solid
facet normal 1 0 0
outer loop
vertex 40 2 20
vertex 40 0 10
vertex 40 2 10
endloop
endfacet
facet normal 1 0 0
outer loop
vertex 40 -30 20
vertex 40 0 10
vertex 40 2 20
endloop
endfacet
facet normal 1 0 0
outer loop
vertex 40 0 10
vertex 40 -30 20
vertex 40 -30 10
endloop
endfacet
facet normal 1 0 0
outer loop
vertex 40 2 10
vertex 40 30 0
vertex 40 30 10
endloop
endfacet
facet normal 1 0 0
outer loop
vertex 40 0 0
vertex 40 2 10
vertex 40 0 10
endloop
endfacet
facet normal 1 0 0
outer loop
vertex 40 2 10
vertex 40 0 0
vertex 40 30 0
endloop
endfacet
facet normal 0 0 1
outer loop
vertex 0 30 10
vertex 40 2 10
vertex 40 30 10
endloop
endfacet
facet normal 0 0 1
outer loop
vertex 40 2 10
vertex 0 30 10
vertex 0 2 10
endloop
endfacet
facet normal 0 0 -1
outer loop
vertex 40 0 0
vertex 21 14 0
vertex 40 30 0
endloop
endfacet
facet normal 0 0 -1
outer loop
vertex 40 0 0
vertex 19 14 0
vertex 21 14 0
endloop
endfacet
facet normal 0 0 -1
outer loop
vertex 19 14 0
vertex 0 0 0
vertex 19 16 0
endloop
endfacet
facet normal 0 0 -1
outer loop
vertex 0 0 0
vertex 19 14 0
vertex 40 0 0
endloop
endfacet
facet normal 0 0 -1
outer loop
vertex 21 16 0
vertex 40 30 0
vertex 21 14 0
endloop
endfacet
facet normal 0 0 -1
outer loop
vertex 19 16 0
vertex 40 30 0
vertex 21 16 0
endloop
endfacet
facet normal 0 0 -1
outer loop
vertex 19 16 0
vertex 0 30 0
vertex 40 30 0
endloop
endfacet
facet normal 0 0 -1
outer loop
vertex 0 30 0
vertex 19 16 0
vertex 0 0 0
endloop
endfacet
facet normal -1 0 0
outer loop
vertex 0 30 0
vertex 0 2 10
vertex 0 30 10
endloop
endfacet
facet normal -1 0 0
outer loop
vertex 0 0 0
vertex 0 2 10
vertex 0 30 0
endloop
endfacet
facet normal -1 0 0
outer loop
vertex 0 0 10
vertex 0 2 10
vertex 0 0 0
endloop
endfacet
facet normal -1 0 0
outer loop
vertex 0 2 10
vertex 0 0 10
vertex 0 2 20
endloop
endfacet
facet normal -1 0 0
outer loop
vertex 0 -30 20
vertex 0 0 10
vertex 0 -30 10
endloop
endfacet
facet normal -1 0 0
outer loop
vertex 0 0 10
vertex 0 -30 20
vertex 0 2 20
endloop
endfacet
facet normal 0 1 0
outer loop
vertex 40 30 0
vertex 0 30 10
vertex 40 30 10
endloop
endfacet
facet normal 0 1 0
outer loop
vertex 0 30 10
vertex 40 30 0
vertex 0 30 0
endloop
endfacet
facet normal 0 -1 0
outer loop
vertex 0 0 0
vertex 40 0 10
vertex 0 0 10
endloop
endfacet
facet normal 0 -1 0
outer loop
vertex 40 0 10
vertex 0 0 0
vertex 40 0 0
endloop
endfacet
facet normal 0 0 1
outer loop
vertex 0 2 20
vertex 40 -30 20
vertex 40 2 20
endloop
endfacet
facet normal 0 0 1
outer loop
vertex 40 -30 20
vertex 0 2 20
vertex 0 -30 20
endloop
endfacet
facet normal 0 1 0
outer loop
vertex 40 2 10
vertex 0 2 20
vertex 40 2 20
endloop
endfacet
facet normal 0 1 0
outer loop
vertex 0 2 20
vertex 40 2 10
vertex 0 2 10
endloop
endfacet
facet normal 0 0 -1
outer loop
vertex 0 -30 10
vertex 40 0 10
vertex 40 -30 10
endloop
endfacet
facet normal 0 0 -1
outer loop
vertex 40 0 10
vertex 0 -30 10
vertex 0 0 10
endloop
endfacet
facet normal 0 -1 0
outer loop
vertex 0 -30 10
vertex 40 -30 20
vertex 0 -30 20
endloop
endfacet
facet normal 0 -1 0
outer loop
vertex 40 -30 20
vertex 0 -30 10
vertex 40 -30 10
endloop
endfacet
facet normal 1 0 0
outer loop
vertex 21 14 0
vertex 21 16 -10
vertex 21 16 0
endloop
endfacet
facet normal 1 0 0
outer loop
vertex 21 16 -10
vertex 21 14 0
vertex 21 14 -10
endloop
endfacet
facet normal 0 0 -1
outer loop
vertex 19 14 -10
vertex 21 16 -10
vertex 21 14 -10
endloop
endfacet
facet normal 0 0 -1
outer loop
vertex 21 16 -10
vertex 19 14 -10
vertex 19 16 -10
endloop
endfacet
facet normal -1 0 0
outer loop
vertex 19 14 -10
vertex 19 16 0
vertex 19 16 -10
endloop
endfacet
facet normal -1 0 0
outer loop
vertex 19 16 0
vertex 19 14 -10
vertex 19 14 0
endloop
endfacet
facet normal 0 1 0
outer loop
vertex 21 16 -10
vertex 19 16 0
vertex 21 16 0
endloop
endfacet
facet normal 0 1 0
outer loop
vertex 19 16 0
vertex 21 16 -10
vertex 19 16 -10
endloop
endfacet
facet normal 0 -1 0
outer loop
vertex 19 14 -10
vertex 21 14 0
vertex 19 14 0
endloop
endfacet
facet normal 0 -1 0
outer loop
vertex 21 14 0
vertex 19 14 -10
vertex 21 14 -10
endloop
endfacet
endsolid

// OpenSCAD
seat_width = 40;
seat_depth = 30;
seat_height = 10;
back_thickness = 2;
seat_thickness = 2;
leg_height = 10;
leg_thickness = 2;
leg_spacing = 10;

union() {
    // Seat
    cube([seat_width, seat_depth, seat_height]);
    
    // Backrest
    translate([0, 0, seat_height])
    cube([seat_width, back_thickness, seat_height]);
    
    // Seat Backrest
    translate([0, -seat_depth, seat_height])
    cube([seat_width, seat_depth, seat_height]);
    
    // Legs
    translate([seat_width/2 - leg_thickness/2, seat_depth/2 - leg_thickness/2, -leg_height])
    cube([leg_thickness, leg_thickness, leg_height]);
    
    translate([seat_width/2 - leg_thickness/2, seat_depth/2 - leg_thickness/2, -leg_height])
    cube([leg_thickness, leg_thickness, leg_height]);
    
    translate([seat_width/2 - leg_thickness/2, seat_depth/2 - leg_thickness/2, -leg_height])
    cube([leg_thickness, leg_thickness, leg_height]);
    
    translate([seat_width/2 - leg_thickness/2, seat_depth/2 - leg_thickness/2, -leg_height])
    cube([leg_thickness, leg_thickness, leg_height]);
}
